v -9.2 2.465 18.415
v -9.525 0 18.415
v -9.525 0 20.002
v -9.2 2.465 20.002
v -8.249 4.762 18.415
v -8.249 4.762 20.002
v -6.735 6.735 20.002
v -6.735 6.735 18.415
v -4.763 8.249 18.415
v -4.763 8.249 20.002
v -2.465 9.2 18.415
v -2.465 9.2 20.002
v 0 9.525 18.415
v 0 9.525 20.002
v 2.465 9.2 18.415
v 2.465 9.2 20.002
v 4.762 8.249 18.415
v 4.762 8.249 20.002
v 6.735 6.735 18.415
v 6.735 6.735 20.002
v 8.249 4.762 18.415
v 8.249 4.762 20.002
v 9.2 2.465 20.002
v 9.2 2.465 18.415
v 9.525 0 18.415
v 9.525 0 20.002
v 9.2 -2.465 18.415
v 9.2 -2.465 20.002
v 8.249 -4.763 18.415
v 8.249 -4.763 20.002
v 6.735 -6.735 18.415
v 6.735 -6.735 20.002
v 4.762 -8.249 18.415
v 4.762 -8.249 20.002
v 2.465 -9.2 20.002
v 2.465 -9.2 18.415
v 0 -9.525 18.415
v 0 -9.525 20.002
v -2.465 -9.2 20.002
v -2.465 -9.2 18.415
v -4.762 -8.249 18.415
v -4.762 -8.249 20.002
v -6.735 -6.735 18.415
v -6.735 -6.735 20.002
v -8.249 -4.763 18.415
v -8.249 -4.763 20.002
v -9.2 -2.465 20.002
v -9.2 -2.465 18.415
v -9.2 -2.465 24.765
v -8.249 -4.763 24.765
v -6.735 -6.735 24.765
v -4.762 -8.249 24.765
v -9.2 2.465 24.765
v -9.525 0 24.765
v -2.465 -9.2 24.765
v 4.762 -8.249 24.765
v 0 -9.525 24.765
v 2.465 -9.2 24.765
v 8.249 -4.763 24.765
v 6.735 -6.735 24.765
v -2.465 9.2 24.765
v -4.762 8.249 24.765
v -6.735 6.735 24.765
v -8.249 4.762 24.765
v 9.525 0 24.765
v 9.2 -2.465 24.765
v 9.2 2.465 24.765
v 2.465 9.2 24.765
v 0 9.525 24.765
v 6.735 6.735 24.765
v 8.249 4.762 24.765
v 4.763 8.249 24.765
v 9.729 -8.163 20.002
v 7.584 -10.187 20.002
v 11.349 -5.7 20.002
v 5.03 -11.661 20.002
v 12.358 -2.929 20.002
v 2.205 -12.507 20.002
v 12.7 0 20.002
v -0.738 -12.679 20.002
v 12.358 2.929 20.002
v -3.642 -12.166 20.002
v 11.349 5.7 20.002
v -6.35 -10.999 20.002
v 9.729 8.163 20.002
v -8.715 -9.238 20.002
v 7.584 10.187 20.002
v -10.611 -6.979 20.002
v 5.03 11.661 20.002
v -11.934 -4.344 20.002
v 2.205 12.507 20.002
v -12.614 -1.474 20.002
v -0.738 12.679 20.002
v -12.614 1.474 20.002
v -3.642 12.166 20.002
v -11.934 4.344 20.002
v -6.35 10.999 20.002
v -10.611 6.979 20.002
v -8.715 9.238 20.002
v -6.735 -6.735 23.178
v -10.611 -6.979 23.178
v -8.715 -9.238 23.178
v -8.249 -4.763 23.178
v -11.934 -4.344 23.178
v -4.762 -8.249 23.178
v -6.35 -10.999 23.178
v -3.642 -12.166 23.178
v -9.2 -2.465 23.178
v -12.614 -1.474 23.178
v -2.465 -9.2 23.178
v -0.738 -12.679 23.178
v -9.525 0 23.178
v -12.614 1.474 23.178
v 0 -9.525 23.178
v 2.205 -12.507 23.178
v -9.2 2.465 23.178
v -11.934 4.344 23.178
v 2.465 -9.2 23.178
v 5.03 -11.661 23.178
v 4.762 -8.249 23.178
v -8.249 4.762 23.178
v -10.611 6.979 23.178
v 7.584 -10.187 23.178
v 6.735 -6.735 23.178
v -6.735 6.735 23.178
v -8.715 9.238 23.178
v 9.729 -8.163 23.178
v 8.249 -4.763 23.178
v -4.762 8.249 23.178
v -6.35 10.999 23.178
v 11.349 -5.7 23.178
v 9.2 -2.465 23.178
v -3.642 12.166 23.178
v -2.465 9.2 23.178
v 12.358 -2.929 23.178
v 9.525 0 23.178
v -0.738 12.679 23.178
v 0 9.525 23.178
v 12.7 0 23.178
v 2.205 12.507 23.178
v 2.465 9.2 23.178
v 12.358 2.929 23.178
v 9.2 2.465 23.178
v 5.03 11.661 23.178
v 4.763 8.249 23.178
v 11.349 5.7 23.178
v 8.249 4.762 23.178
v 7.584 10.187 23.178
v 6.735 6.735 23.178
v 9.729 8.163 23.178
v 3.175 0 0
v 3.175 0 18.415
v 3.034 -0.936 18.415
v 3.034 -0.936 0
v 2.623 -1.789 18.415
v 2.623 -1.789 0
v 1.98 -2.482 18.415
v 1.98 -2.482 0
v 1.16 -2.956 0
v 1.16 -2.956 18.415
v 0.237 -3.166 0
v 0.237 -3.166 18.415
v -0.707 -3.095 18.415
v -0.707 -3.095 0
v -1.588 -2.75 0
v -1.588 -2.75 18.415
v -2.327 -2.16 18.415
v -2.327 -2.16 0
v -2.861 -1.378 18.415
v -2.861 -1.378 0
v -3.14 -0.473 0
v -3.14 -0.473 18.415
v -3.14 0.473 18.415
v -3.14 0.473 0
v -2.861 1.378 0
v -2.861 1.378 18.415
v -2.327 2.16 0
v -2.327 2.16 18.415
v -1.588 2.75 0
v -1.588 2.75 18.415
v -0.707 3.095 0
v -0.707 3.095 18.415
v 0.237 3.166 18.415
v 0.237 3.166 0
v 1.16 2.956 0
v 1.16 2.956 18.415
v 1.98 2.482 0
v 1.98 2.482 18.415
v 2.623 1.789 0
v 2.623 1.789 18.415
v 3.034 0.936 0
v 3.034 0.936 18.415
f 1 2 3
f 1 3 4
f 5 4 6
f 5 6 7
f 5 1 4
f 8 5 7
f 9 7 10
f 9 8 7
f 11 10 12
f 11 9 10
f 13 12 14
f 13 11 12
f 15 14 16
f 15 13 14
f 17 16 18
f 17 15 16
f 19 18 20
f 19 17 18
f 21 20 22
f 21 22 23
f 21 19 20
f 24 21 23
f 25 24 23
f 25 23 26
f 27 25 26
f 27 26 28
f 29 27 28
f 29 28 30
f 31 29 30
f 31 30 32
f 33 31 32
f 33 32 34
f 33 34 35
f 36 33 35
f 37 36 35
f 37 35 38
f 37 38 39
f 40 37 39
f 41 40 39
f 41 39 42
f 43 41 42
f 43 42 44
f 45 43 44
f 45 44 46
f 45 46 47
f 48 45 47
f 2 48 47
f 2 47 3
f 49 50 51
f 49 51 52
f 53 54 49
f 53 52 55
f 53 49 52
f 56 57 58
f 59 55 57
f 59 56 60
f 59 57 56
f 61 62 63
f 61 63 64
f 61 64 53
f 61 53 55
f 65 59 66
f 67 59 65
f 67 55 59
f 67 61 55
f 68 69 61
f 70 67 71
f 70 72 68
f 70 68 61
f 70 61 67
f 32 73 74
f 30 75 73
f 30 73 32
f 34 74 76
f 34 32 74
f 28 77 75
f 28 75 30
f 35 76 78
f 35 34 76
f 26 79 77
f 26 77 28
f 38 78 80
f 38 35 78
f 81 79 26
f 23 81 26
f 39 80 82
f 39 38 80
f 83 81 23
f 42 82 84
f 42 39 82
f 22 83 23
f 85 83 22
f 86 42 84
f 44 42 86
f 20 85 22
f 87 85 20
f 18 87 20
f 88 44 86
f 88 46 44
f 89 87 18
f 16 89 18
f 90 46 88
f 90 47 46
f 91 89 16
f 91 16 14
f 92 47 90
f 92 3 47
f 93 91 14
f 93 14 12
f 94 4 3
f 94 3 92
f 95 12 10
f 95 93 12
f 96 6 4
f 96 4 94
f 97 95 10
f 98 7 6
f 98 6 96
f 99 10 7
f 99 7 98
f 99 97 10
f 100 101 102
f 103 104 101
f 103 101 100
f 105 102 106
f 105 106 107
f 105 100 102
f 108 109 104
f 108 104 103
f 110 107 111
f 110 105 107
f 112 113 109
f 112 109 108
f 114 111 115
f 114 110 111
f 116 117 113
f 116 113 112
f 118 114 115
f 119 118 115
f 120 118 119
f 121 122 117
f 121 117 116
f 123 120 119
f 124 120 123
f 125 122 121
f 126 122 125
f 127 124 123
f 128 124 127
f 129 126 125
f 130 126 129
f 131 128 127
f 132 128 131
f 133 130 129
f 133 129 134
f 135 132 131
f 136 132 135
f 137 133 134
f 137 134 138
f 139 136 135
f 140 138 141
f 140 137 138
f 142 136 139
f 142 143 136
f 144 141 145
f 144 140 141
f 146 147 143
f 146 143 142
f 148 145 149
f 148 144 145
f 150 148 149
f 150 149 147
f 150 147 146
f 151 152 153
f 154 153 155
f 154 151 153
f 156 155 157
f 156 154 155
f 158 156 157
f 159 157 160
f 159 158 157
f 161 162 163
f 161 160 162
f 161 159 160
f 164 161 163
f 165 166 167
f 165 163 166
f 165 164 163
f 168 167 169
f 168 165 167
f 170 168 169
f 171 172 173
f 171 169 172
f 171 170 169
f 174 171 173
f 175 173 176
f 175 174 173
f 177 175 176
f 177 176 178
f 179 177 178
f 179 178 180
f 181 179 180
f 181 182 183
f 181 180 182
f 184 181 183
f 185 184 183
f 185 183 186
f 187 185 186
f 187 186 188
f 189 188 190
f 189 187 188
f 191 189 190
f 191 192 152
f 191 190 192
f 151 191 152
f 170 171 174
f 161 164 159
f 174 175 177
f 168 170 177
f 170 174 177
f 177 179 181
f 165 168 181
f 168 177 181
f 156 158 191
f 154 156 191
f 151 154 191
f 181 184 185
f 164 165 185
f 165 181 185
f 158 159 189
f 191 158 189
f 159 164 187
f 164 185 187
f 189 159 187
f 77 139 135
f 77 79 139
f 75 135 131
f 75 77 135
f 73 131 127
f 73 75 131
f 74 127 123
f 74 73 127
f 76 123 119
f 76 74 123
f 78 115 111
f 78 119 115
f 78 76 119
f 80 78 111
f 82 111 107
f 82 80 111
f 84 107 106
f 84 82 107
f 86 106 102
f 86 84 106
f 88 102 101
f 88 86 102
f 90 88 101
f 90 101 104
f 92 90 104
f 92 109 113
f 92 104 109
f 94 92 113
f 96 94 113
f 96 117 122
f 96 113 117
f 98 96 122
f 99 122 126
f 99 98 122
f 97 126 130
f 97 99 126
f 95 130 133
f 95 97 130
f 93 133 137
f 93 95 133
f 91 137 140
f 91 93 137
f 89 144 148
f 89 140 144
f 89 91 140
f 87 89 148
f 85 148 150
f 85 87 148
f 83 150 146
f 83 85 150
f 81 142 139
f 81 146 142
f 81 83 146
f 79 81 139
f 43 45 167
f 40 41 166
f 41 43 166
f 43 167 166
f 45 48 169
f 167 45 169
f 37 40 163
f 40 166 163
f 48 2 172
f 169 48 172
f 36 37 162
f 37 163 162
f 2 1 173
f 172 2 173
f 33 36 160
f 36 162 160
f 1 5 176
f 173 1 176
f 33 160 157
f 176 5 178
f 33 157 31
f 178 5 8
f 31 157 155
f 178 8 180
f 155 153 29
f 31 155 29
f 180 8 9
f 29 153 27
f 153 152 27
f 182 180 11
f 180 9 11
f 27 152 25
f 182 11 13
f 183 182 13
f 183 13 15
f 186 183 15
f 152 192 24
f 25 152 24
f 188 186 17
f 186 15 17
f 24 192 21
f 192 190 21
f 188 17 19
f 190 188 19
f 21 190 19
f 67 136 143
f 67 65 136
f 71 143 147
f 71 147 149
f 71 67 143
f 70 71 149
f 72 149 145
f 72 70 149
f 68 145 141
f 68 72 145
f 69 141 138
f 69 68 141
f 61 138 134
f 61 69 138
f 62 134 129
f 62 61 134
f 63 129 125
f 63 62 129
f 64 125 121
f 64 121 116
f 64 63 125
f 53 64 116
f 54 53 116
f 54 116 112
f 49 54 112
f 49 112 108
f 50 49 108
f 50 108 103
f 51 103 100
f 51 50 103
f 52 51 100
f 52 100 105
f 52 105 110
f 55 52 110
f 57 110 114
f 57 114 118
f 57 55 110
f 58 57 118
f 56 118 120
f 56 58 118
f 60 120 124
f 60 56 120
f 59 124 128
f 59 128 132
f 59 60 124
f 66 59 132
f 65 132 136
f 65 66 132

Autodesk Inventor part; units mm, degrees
ref_plane "YZ Plane" through (0, 0, 0) normal (1, 0, 0) x (0, 1, 0)
ref_plane "XZ Plane" through (0, 0, 0) normal (0, 1, 0) x (-1, 0, 0)
ref_plane "XY Plane" through (0, 0, 0) normal (0, 0, 1) x (1, 0, 0)
sketch "Sketch1" plane through (0, 0, 0) normal (0, 0, 1) x (1, 0, 0)
  circle A0 centre (0, 0) radius 3.175
  dimension "d0" = 6.35
extrude "Extrusion1" add sketch "Sketch1" along normal blind 18.415
sketch "Sketch2" plane through (0, 0, 18.415) normal (0, 0, 1) x (1, 0, 0)
  circle A0 centre (0, 0) radius 12.7
  dimension "d3" = 25.4
extrude "Extrusion2" add sketch "Sketch2" along normal blind 6.35
sketch "Sketch3" plane through (0, 0, 24.765) normal (0, 0, 1) x (1, 0, 0)
  circle A0 centre (0, 0) radius 9.525
  circle A1 centre (0, 0) radius 12.7 projected
  dimension "d6" = 3.175
extrude "Extrusion3" cut sketch "Sketch3" against normal blind 1.5875
sketch "Sketch4" plane through (0, 0, 18.415) normal (0, 0, -1) x (-1, 0, 0)
  circle A0 centre (0, 0) radius 9.525 projected
  circle A1 centre (0, 0) radius 12.7 projected
  circle A2 centre (0, 0) radius 3.175 projected
extrude "Extrusion4" cut sketch "Sketch4" against normal blind 1.5875 contours A1
properties part number "ScissorLiftSliderWheel"
